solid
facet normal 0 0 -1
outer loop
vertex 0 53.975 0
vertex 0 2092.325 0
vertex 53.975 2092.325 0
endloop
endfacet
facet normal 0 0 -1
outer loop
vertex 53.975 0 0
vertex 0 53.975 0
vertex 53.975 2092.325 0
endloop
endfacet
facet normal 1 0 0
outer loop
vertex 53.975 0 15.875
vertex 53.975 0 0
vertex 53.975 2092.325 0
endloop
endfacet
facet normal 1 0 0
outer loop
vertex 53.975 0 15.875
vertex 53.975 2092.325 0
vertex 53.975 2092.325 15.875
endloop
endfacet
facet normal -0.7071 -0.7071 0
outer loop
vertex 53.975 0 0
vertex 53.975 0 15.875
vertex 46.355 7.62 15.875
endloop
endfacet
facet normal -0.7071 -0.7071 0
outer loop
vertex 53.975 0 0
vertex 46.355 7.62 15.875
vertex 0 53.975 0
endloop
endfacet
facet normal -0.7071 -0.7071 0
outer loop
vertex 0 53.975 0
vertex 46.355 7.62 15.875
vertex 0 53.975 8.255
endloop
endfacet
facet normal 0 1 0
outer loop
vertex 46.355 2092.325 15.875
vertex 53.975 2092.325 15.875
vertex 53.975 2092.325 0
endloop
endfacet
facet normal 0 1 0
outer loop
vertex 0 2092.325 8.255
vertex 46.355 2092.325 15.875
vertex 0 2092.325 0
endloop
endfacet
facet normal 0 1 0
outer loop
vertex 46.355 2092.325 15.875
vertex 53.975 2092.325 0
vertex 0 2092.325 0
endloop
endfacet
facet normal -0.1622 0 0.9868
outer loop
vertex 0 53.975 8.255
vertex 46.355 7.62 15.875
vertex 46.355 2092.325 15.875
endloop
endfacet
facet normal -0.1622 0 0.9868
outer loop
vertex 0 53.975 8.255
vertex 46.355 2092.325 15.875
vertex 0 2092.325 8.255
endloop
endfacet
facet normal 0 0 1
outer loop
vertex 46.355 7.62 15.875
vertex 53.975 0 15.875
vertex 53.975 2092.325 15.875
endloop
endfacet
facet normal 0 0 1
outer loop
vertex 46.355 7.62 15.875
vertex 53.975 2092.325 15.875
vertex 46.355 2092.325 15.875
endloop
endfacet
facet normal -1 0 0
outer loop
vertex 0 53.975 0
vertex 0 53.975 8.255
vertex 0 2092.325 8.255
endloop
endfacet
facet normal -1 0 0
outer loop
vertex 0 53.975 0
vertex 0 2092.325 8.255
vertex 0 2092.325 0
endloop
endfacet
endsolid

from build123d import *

# Parameters (mm, degrees)
BOSS_EXTRUDE1_DEPTH = 2092.325
CUT_EXTRUDE2_DEPTH  = 2094.081274551


with BuildPart() as part:
    # Sketch1 → Boss-Extrude1 (new body)
    with BuildSketch(Plane(origin=(0, 0, 0), x_dir=(1, 0, 0), z_dir=(0, 1, 0))):
        Polygon((0, 0), (53.975, 0), (53.975, -15.875), (46.355, -15.875), (0, -8.255), align=None)
    extrude(amount=BOSS_EXTRUDE1_DEPTH)

    # Sketch3 → Cut-Extrude2 (cut, through all)
    with BuildSketch(Plane.XY.offset(15.875)):
        Polygon((53.975, 0), (0, 53.975), (0, 0), align=None)
    extrude(amount=-CUT_EXTRUDE2_DEPTH, mode=Mode.SUBTRACT)


solid = part.part
